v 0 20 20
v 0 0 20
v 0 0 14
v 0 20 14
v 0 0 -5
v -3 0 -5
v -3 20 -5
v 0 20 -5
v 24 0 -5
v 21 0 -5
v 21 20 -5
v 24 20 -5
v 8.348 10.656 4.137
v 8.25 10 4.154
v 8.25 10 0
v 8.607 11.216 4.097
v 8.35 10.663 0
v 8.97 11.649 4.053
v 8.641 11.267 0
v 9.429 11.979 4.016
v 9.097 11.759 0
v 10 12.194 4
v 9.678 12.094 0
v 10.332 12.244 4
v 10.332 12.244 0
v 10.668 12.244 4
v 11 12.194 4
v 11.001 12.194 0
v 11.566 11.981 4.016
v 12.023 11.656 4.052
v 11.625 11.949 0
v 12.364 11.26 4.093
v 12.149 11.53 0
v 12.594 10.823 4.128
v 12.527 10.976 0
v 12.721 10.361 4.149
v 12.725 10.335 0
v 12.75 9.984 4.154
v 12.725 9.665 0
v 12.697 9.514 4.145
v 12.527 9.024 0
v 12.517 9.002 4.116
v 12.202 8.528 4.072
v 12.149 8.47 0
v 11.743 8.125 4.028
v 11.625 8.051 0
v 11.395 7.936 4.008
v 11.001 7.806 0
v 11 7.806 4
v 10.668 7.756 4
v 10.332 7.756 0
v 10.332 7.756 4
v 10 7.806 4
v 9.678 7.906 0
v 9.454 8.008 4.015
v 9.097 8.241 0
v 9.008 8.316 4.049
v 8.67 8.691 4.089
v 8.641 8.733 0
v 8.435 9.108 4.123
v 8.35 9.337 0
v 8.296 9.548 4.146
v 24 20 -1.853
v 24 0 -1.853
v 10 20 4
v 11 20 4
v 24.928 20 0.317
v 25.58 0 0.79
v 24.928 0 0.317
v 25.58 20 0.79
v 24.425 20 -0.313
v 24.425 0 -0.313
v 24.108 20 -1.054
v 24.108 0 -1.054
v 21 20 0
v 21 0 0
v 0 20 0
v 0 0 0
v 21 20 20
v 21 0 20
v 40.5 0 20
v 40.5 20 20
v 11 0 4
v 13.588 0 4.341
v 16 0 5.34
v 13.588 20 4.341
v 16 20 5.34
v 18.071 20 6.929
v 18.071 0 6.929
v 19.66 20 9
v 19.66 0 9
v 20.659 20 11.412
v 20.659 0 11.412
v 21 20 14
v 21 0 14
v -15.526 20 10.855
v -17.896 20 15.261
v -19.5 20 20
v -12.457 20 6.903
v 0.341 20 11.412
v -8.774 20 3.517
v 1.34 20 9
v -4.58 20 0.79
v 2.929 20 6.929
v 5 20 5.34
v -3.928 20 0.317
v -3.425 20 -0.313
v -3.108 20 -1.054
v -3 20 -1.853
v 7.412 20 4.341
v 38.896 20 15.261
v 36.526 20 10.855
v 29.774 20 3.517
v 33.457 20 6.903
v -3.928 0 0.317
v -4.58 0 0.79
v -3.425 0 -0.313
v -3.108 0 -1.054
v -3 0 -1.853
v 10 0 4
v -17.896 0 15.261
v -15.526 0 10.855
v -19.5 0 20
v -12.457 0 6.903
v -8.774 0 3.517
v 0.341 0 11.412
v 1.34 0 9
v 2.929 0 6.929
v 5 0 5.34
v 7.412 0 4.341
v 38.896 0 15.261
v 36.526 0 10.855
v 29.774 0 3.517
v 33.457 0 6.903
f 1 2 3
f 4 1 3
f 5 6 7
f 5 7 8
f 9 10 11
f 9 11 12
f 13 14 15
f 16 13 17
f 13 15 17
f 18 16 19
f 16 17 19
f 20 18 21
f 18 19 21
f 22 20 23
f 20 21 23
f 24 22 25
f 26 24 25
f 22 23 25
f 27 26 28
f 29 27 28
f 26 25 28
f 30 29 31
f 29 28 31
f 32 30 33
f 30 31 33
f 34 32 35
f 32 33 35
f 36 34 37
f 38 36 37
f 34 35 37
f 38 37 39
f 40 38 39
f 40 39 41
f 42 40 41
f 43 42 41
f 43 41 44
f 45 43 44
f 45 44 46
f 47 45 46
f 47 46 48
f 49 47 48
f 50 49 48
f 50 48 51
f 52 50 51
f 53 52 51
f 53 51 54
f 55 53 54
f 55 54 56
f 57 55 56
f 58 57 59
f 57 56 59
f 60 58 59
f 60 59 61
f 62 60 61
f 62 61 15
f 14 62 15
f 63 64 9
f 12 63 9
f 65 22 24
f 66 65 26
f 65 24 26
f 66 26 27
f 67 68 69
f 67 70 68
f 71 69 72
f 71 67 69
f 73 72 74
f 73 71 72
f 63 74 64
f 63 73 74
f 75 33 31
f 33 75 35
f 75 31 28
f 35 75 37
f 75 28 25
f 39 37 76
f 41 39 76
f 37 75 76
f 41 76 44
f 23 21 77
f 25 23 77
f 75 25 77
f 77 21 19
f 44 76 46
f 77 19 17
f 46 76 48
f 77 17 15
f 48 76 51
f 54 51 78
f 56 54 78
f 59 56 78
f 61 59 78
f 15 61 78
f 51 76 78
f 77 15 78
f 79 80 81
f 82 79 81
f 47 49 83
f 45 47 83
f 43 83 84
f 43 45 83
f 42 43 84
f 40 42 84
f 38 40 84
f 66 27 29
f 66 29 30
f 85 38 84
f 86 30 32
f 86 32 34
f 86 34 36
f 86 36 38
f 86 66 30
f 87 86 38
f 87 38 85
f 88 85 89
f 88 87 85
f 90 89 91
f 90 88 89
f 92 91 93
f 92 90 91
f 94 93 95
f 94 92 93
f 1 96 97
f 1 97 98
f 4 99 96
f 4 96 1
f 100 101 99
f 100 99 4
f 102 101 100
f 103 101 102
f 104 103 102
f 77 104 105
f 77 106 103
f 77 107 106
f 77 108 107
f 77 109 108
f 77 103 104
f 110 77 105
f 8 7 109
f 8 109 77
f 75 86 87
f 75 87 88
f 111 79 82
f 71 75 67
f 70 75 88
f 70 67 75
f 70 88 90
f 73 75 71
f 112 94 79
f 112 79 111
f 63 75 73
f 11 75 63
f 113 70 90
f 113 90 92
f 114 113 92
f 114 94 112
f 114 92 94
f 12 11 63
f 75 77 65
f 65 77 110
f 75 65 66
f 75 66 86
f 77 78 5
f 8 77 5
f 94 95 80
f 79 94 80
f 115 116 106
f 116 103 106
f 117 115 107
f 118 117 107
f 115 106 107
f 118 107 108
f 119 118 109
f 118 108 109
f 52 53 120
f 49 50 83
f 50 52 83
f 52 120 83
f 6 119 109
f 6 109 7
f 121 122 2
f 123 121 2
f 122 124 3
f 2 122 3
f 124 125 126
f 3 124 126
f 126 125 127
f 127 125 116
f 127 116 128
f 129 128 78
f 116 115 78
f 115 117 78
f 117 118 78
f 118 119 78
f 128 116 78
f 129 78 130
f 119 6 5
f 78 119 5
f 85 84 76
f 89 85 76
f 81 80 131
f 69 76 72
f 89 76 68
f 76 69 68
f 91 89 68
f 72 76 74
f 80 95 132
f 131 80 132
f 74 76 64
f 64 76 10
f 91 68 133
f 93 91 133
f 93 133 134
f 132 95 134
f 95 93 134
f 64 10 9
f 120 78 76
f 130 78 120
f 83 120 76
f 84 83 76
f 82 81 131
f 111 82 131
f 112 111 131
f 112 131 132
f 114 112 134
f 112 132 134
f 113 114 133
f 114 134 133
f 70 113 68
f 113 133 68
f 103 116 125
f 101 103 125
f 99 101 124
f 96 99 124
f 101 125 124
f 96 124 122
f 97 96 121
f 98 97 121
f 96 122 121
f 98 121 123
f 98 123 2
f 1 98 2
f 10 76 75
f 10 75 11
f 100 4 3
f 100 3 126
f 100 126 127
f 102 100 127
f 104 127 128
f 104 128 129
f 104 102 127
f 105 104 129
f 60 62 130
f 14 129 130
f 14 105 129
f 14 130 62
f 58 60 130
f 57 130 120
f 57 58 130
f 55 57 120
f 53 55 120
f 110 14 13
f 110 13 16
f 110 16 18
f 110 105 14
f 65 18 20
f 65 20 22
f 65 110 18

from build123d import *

# Parameters (mm, degrees)
SKETCH_1_W          = 21
SKETCH_1_H          = 4
SKETCH_1_W_2        = 3
SKETCH_1_H_2        = 5
EXTRUDE_1_DEPTH     = 20
FILLET_1_R          = 10
FILLET_2_R          = 3
CUT_EXTRUDE_1_REACH = 51.399
SKETCH_2_R          = 2.25


with BuildPart() as part:
    # 草图1 → 凸台-拉伸1 (new body)
    with BuildSketch(Plane(origin=(0, 0, 0), x_dir=(1, 0, 0), z_dir=(0, 1, 0))):
        with BuildLine():
            Line((0, -4), (0, 0))
            Line((0, 0), (-3, 0))
            ThreePointArc((-3, 0), (-13.522200743, -8.125434387), (-19.5, -20))
            Line((-19.5, -20), (0, -20))
            Line((0, -20), (0, -4))
        make_face()
        with Locations((10.5, -2)):
            Rectangle(SKETCH_1_W, SKETCH_1_H)
        with Locations((-1.5, 2.5)):
            Rectangle(SKETCH_1_W_2, SKETCH_1_H_2)
        with Locations((22.5, 2.5)):
            Rectangle(SKETCH_1_W_2, SKETCH_1_H_2)
        with BuildLine():
            Line((24, 0), (21, 0))
            Line((21, 0), (21, -4))
            Line((21, -4), (21, -20))
            Line((21, -20), (40.5, -20))
            ThreePointArc((40.5, -20), (34.522200743, -8.125434387), (24, 0))
        make_face()
    extrude(amount=EXTRUDE_1_DEPTH)

    # 圆角1
    fillet_1_edges = [part.edges().sort_by_distance(p)[0] for p in [
        (21, 10, 4),
        (0, 10, 4),
    ]]
    fillet(fillet_1_edges, radius=FILLET_1_R)

    # 圆角2
    fillet_2_edges = [part.edges().sort_by_distance(p)[0] for p in [
        (24, 10, 0),
        (-3, 10, 0),
    ]]
    fillet(fillet_2_edges, radius=FILLET_2_R)

    # 草图2 → 切除-拉伸1 (cut, up to next)
    with BuildSketch(Plane(origin=(0, 0, 0), x_dir=(-1, 0, 0), z_dir=(0, 0, -1)), mode=Mode.PRIVATE) as cut_extrude_1_sk1:
        with Locations((-10.5, 10)):
            Circle(SKETCH_2_R)
    cut_extrude_1_tool1 = extrude(cut_extrude_1_sk1.sketch, amount=-CUT_EXTRUDE_1_REACH, mode=Mode.PRIVATE) & part.part
    add(cut_extrude_1_tool1.solids().sort_by_distance((10.5, 10, 0))[0], mode=Mode.SUBTRACT)


solid = part.part
